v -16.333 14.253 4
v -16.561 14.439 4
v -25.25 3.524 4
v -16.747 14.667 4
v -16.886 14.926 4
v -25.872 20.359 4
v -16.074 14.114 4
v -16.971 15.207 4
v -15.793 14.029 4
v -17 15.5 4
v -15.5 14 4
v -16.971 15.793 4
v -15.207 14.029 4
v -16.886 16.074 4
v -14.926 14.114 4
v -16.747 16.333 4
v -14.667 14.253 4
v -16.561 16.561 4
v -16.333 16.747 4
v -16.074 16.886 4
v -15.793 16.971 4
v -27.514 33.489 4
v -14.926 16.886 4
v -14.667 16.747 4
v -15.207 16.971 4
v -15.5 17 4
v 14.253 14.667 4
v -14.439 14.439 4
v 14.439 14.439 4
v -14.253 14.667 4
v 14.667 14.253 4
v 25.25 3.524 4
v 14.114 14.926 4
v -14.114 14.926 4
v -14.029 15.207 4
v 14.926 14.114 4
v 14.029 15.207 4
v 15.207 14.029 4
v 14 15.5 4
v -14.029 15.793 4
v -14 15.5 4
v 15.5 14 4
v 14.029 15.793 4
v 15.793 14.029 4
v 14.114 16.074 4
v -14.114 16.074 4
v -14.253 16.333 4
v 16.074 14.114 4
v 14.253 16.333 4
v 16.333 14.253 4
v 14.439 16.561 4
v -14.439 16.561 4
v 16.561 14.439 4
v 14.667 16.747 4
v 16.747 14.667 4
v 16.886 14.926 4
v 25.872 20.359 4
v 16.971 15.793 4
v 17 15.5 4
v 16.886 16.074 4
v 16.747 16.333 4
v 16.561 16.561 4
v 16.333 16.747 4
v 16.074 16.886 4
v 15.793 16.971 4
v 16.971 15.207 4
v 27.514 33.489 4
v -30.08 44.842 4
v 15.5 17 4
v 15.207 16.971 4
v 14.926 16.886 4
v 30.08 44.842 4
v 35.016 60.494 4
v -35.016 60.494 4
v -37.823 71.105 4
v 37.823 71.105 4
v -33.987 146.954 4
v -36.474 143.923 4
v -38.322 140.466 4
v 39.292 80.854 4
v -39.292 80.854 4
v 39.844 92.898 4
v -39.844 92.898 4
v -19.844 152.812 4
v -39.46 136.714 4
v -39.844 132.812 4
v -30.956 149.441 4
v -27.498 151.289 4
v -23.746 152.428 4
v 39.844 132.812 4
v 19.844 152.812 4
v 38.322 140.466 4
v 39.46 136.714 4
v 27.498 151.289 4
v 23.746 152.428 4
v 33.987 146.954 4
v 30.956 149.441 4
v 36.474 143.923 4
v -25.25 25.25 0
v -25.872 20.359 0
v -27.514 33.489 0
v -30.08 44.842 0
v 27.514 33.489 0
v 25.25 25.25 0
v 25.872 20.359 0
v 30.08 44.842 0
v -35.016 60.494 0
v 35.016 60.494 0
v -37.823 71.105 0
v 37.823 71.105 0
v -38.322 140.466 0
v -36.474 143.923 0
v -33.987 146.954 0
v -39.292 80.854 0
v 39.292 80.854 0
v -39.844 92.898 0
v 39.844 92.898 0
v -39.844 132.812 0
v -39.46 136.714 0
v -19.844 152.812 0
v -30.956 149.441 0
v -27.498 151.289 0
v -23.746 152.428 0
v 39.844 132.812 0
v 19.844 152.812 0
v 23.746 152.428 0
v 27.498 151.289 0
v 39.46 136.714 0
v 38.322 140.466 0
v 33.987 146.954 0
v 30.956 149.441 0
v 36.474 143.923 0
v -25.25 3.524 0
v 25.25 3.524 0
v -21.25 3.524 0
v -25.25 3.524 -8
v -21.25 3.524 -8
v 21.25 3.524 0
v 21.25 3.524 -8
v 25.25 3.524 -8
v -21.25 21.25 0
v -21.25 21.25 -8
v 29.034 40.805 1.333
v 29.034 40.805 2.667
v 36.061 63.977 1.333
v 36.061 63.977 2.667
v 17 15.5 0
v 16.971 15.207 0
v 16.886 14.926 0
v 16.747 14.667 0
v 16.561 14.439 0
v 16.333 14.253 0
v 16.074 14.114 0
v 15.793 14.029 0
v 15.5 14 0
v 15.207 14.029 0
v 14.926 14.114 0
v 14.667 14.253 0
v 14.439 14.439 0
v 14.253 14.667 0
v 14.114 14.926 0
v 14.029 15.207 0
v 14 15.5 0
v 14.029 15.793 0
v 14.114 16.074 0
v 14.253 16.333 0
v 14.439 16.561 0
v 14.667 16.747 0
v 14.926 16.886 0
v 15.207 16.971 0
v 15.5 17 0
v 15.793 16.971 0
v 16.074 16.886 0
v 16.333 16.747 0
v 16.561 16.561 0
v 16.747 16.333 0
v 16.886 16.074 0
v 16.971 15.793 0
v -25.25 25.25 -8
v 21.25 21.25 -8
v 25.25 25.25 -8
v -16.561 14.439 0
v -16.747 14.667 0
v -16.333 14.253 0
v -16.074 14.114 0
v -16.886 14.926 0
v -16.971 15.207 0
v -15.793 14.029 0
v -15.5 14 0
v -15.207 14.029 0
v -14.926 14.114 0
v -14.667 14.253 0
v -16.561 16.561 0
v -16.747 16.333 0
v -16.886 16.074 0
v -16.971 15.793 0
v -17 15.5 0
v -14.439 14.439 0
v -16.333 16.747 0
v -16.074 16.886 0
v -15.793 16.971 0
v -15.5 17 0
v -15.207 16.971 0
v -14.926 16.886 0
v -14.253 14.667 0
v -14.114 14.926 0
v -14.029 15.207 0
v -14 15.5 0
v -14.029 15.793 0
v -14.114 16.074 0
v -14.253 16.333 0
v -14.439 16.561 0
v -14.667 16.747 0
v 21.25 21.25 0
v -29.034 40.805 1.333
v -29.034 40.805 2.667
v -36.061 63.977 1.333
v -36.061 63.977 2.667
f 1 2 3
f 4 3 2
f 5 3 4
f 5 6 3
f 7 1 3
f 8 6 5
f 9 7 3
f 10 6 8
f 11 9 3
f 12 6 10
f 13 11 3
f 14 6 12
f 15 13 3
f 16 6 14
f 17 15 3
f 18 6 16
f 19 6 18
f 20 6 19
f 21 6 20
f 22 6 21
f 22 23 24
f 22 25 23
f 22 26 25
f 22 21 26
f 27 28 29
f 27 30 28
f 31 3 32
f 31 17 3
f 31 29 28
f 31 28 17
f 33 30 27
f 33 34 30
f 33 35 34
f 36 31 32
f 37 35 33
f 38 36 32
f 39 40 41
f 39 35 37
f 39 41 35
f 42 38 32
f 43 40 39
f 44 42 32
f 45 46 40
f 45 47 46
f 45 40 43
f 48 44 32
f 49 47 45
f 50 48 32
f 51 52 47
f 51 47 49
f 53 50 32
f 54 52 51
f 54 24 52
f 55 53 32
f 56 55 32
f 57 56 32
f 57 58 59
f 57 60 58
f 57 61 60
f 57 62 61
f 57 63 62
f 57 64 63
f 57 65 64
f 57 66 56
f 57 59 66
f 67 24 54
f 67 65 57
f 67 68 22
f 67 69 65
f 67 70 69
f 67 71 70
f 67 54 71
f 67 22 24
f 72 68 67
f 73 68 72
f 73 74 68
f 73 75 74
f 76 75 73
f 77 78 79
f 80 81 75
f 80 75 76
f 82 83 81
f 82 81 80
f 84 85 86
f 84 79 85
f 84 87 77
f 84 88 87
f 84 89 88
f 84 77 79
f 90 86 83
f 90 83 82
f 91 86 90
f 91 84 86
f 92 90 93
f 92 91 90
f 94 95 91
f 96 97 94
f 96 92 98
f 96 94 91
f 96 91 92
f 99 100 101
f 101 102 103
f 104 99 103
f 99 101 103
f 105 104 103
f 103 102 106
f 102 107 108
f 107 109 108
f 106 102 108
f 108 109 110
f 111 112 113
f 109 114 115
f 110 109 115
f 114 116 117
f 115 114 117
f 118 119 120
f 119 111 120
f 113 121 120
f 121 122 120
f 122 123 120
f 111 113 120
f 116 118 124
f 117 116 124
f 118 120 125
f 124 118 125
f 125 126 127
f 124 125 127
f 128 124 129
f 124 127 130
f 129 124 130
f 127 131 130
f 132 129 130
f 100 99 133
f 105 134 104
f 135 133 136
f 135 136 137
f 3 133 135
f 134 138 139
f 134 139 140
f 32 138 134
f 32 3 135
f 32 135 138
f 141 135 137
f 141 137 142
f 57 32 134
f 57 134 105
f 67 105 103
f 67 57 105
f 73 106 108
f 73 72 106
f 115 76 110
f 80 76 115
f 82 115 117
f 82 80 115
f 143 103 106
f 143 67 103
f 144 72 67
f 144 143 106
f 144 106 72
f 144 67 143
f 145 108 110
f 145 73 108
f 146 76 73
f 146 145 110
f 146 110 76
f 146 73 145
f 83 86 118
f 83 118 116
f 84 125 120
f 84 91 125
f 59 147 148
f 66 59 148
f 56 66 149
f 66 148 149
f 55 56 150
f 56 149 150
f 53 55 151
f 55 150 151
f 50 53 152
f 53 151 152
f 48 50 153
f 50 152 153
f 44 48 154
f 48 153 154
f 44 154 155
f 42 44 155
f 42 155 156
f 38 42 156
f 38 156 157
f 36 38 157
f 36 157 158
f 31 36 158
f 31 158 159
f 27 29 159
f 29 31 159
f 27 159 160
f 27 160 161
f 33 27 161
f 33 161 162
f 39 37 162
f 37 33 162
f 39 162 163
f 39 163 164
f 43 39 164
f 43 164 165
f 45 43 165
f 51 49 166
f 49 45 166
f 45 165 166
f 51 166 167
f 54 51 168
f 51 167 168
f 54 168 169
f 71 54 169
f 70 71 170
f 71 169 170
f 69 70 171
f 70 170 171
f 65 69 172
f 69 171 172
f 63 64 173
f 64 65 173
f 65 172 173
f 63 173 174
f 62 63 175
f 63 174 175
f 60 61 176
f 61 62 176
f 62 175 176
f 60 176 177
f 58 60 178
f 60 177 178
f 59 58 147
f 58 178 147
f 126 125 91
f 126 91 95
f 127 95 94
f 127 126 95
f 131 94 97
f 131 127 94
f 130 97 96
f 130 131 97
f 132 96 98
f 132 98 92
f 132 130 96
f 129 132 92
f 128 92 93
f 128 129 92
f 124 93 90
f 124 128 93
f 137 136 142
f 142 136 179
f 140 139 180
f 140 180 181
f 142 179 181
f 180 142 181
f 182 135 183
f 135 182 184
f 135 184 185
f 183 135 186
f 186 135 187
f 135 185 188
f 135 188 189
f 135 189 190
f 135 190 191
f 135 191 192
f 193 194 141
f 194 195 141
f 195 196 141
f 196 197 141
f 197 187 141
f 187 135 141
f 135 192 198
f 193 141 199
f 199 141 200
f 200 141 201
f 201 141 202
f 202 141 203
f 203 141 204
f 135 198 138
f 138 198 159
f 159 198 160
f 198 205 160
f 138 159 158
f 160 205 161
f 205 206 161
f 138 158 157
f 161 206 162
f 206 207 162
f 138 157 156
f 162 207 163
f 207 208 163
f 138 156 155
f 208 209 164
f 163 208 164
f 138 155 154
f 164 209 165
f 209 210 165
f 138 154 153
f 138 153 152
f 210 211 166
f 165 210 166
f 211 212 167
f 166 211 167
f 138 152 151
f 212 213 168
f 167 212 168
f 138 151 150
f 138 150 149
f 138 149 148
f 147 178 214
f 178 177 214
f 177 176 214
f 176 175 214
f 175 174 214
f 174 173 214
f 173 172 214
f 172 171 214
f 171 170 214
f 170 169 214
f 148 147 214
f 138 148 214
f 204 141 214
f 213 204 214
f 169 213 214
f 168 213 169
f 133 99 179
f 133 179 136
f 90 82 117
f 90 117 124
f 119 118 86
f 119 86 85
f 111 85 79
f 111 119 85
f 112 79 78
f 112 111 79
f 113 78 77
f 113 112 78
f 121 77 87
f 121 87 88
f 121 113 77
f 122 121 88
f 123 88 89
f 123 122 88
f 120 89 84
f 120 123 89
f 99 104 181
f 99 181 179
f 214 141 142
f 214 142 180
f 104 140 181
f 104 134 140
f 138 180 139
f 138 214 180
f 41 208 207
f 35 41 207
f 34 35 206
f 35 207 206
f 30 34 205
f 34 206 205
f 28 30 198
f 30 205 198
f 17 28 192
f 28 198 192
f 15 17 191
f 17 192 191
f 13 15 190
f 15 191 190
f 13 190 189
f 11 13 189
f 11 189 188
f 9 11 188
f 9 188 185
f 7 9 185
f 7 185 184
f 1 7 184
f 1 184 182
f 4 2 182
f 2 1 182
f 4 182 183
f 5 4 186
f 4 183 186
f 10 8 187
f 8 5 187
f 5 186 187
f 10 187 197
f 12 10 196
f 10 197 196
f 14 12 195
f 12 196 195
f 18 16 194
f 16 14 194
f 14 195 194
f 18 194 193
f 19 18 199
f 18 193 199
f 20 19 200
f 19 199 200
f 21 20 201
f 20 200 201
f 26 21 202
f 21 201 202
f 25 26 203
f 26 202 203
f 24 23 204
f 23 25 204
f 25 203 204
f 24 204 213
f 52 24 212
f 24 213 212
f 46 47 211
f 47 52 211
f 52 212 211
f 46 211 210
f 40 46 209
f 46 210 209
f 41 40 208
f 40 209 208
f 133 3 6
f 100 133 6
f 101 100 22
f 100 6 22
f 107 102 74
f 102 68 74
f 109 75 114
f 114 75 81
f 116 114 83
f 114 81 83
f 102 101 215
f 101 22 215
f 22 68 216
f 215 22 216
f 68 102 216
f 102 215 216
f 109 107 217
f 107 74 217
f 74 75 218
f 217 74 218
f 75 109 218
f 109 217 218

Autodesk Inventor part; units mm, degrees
ref_plane "YZ Plane" through (0, 0, 0) normal (1, 0, 0) x (0, 1, 0)
ref_plane "XZ Plane" through (0, 0, 0) normal (0, 1, 0) x (-1, 0, 0)
ref_plane "XY Plane" through (0, 0, 0) normal (0, 0, 1) x (1, 0, 0)
sketch "Sketch1" plane through (0, 0, 0) normal (0, 0, 1) x (1, 0, 0)
  line L0 (-21.25, 21.25) -> (21.25, 21.25)
  line L1 (21.25, 21.25) -> (21.25, -21.25)
  line L2 (21.25, -21.25) -> (-21.25, -21.25)
  line L3 (-21.25, -21.25) -> (-21.25, 21.25)
  line L4 (-21.25, 21.25) -> (21.25, -21.25) construction
  line L5 (21.25, 21.25) -> (-21.25, -21.25) construction
  circle A0 centre (0, 0) radius 11 construction
  circle A1 centre (0, 0) radius 12.5
  line L6 (-25.25, 3.5236) -> (25.25, 3.5236)
  line L7 (25.25, 3.5236) -> (25.25, 25.25)
  line L8 (25.25, 25.25) -> (-25.25, 25.25)
  line L9 (-25.25, 25.25) -> (-25.25, 3.5236)
  circle A2 centre (-15.5, 15.5) radius 1.5
  circle A3 centre (15.5, 15.5) radius 1.5
  point P0 (21.25, 3.5236)
  point P1 (-21.25, 3.5236)
  dimension "d0" = 42.5
  dimension "d1" = 42.5
  dimension "d2" = 22
  dimension "d3" = 25
  dimension "d4" = 4
  dimension "d5" = 4
  dimension "d6" = 4
  dimension "d7" = 3
  dimension "d8" = 3
  dimension "d9" = 15.5
  dimension "d10" = 15.5
  dimension "d11" = 15.5
  dimension "d12" = 15.5
extrude "Extrusion1" add sketch "Sketch1" along normal blind 4 contours L3 L6 L9 L8 L7 L1 L0 | L0 L1 L6 A1 L3 | A1 L6 picked at (3.04, 5.1985)
extrude "Extrusion2" cut sketch "Sketch1" along normal blind 4 contours L6 A1 | A1 L6
extrude "Extrusion3" add sketch "Sketch1" against normal blind 8 contours L3 L6 L9 L8 L7 L1 L0
sketch "Sketch2" plane through (0, 0, 4) normal (0, 0, 1) x (1, 0, 0)
  circle A0 centre (0, 0) radius 40 construction
  line L0 (-25.25, 3.5236) -> (25.25, 3.5236) construction
  line L1 (-25.25, 3.5236) -> (-11.9931, 3.5236) projected
  line L2 (-25.25, 3.5236) -> (25.25, 3.5236)
  line L3 (39.8445, 92.8978) -> (39.8445, 152.8119)
  line L4 (39.8445, 152.8119) -> (-39.8445, 152.8119)
  line L5 (-39.8445, 152.8119) -> (-39.8445, 92.8978)
  circle A1 centre (-15.5, 15.5) radius 1.5 projected
  circle A2 centre (-15.5, 15.5) radius 1.5
  circle A3 centre (15.5, 15.5) radius 1.5 projected
  circle A4 centre (15.5, 15.5) radius 1.5
  line L6 (25.25, 54.4811) -> (25.25, 3.5236) projected
  line L7 (25.25, 54.4811) -> (25.25, -31.0232) construction
  line L8 (-25.25, 25.25) -> (-25.25, -31.0232) construction
  line L9 (25.25, 3.5236) -> (25.25, 54.4811) projected
  line L10 (25.25, 3.5236) -> (25.25, 54.4811) construction
  line L11 (25.25, 54.4811) -> (39.8445, 54.4811) construction
  line L12 (39.8445, 54.4811) -> (39.8445, 92.8978) construction
  spline S0 degree 3 poles (25.25, 3.5236) (25.25, 54.4811) (39.8445, 54.4811) (39.8445, 92.8978) knots 1 1 1 1 2 2 2 2
  line L13 (-25.25, 3.5236) -> (-25.25, 54.4811) construction
  line L14 (-25.25, 54.4811) -> (-39.8445, 54.4811) construction
  line L15 (-39.8445, 54.4811) -> (-39.8445, 92.8978) construction
  spline S1 degree 3 poles (-25.25, 3.5236) (-25.25, 54.4811) (-39.8445, 54.4811) (-39.8445, 92.8978) knots 1 1 1 1 2 2 2 2
  point P0 (-39.8445, 3.5236)
  point P1 (39.8445, 3.5236)
  dimension "d19" = 80
  dimension "d20" = 150
  dimension "d21" = 39.8445
extrude "Extrusion4" add sketch "Sketch2" against normal blind 4
fillet "Fillet1" radius 20 2 edges at (-39.8445, 152.8119, 2) (39.8445, 152.8119, 2)
equation "\"d1\" = d0"
equation "\"d5\" = d4"
equation "\"d6\" = d4"
equation "\"d8\" = d7"
equation "\"d11\" = d9"
equation "\"d12\" = d10"
properties part number "Sideplate"
